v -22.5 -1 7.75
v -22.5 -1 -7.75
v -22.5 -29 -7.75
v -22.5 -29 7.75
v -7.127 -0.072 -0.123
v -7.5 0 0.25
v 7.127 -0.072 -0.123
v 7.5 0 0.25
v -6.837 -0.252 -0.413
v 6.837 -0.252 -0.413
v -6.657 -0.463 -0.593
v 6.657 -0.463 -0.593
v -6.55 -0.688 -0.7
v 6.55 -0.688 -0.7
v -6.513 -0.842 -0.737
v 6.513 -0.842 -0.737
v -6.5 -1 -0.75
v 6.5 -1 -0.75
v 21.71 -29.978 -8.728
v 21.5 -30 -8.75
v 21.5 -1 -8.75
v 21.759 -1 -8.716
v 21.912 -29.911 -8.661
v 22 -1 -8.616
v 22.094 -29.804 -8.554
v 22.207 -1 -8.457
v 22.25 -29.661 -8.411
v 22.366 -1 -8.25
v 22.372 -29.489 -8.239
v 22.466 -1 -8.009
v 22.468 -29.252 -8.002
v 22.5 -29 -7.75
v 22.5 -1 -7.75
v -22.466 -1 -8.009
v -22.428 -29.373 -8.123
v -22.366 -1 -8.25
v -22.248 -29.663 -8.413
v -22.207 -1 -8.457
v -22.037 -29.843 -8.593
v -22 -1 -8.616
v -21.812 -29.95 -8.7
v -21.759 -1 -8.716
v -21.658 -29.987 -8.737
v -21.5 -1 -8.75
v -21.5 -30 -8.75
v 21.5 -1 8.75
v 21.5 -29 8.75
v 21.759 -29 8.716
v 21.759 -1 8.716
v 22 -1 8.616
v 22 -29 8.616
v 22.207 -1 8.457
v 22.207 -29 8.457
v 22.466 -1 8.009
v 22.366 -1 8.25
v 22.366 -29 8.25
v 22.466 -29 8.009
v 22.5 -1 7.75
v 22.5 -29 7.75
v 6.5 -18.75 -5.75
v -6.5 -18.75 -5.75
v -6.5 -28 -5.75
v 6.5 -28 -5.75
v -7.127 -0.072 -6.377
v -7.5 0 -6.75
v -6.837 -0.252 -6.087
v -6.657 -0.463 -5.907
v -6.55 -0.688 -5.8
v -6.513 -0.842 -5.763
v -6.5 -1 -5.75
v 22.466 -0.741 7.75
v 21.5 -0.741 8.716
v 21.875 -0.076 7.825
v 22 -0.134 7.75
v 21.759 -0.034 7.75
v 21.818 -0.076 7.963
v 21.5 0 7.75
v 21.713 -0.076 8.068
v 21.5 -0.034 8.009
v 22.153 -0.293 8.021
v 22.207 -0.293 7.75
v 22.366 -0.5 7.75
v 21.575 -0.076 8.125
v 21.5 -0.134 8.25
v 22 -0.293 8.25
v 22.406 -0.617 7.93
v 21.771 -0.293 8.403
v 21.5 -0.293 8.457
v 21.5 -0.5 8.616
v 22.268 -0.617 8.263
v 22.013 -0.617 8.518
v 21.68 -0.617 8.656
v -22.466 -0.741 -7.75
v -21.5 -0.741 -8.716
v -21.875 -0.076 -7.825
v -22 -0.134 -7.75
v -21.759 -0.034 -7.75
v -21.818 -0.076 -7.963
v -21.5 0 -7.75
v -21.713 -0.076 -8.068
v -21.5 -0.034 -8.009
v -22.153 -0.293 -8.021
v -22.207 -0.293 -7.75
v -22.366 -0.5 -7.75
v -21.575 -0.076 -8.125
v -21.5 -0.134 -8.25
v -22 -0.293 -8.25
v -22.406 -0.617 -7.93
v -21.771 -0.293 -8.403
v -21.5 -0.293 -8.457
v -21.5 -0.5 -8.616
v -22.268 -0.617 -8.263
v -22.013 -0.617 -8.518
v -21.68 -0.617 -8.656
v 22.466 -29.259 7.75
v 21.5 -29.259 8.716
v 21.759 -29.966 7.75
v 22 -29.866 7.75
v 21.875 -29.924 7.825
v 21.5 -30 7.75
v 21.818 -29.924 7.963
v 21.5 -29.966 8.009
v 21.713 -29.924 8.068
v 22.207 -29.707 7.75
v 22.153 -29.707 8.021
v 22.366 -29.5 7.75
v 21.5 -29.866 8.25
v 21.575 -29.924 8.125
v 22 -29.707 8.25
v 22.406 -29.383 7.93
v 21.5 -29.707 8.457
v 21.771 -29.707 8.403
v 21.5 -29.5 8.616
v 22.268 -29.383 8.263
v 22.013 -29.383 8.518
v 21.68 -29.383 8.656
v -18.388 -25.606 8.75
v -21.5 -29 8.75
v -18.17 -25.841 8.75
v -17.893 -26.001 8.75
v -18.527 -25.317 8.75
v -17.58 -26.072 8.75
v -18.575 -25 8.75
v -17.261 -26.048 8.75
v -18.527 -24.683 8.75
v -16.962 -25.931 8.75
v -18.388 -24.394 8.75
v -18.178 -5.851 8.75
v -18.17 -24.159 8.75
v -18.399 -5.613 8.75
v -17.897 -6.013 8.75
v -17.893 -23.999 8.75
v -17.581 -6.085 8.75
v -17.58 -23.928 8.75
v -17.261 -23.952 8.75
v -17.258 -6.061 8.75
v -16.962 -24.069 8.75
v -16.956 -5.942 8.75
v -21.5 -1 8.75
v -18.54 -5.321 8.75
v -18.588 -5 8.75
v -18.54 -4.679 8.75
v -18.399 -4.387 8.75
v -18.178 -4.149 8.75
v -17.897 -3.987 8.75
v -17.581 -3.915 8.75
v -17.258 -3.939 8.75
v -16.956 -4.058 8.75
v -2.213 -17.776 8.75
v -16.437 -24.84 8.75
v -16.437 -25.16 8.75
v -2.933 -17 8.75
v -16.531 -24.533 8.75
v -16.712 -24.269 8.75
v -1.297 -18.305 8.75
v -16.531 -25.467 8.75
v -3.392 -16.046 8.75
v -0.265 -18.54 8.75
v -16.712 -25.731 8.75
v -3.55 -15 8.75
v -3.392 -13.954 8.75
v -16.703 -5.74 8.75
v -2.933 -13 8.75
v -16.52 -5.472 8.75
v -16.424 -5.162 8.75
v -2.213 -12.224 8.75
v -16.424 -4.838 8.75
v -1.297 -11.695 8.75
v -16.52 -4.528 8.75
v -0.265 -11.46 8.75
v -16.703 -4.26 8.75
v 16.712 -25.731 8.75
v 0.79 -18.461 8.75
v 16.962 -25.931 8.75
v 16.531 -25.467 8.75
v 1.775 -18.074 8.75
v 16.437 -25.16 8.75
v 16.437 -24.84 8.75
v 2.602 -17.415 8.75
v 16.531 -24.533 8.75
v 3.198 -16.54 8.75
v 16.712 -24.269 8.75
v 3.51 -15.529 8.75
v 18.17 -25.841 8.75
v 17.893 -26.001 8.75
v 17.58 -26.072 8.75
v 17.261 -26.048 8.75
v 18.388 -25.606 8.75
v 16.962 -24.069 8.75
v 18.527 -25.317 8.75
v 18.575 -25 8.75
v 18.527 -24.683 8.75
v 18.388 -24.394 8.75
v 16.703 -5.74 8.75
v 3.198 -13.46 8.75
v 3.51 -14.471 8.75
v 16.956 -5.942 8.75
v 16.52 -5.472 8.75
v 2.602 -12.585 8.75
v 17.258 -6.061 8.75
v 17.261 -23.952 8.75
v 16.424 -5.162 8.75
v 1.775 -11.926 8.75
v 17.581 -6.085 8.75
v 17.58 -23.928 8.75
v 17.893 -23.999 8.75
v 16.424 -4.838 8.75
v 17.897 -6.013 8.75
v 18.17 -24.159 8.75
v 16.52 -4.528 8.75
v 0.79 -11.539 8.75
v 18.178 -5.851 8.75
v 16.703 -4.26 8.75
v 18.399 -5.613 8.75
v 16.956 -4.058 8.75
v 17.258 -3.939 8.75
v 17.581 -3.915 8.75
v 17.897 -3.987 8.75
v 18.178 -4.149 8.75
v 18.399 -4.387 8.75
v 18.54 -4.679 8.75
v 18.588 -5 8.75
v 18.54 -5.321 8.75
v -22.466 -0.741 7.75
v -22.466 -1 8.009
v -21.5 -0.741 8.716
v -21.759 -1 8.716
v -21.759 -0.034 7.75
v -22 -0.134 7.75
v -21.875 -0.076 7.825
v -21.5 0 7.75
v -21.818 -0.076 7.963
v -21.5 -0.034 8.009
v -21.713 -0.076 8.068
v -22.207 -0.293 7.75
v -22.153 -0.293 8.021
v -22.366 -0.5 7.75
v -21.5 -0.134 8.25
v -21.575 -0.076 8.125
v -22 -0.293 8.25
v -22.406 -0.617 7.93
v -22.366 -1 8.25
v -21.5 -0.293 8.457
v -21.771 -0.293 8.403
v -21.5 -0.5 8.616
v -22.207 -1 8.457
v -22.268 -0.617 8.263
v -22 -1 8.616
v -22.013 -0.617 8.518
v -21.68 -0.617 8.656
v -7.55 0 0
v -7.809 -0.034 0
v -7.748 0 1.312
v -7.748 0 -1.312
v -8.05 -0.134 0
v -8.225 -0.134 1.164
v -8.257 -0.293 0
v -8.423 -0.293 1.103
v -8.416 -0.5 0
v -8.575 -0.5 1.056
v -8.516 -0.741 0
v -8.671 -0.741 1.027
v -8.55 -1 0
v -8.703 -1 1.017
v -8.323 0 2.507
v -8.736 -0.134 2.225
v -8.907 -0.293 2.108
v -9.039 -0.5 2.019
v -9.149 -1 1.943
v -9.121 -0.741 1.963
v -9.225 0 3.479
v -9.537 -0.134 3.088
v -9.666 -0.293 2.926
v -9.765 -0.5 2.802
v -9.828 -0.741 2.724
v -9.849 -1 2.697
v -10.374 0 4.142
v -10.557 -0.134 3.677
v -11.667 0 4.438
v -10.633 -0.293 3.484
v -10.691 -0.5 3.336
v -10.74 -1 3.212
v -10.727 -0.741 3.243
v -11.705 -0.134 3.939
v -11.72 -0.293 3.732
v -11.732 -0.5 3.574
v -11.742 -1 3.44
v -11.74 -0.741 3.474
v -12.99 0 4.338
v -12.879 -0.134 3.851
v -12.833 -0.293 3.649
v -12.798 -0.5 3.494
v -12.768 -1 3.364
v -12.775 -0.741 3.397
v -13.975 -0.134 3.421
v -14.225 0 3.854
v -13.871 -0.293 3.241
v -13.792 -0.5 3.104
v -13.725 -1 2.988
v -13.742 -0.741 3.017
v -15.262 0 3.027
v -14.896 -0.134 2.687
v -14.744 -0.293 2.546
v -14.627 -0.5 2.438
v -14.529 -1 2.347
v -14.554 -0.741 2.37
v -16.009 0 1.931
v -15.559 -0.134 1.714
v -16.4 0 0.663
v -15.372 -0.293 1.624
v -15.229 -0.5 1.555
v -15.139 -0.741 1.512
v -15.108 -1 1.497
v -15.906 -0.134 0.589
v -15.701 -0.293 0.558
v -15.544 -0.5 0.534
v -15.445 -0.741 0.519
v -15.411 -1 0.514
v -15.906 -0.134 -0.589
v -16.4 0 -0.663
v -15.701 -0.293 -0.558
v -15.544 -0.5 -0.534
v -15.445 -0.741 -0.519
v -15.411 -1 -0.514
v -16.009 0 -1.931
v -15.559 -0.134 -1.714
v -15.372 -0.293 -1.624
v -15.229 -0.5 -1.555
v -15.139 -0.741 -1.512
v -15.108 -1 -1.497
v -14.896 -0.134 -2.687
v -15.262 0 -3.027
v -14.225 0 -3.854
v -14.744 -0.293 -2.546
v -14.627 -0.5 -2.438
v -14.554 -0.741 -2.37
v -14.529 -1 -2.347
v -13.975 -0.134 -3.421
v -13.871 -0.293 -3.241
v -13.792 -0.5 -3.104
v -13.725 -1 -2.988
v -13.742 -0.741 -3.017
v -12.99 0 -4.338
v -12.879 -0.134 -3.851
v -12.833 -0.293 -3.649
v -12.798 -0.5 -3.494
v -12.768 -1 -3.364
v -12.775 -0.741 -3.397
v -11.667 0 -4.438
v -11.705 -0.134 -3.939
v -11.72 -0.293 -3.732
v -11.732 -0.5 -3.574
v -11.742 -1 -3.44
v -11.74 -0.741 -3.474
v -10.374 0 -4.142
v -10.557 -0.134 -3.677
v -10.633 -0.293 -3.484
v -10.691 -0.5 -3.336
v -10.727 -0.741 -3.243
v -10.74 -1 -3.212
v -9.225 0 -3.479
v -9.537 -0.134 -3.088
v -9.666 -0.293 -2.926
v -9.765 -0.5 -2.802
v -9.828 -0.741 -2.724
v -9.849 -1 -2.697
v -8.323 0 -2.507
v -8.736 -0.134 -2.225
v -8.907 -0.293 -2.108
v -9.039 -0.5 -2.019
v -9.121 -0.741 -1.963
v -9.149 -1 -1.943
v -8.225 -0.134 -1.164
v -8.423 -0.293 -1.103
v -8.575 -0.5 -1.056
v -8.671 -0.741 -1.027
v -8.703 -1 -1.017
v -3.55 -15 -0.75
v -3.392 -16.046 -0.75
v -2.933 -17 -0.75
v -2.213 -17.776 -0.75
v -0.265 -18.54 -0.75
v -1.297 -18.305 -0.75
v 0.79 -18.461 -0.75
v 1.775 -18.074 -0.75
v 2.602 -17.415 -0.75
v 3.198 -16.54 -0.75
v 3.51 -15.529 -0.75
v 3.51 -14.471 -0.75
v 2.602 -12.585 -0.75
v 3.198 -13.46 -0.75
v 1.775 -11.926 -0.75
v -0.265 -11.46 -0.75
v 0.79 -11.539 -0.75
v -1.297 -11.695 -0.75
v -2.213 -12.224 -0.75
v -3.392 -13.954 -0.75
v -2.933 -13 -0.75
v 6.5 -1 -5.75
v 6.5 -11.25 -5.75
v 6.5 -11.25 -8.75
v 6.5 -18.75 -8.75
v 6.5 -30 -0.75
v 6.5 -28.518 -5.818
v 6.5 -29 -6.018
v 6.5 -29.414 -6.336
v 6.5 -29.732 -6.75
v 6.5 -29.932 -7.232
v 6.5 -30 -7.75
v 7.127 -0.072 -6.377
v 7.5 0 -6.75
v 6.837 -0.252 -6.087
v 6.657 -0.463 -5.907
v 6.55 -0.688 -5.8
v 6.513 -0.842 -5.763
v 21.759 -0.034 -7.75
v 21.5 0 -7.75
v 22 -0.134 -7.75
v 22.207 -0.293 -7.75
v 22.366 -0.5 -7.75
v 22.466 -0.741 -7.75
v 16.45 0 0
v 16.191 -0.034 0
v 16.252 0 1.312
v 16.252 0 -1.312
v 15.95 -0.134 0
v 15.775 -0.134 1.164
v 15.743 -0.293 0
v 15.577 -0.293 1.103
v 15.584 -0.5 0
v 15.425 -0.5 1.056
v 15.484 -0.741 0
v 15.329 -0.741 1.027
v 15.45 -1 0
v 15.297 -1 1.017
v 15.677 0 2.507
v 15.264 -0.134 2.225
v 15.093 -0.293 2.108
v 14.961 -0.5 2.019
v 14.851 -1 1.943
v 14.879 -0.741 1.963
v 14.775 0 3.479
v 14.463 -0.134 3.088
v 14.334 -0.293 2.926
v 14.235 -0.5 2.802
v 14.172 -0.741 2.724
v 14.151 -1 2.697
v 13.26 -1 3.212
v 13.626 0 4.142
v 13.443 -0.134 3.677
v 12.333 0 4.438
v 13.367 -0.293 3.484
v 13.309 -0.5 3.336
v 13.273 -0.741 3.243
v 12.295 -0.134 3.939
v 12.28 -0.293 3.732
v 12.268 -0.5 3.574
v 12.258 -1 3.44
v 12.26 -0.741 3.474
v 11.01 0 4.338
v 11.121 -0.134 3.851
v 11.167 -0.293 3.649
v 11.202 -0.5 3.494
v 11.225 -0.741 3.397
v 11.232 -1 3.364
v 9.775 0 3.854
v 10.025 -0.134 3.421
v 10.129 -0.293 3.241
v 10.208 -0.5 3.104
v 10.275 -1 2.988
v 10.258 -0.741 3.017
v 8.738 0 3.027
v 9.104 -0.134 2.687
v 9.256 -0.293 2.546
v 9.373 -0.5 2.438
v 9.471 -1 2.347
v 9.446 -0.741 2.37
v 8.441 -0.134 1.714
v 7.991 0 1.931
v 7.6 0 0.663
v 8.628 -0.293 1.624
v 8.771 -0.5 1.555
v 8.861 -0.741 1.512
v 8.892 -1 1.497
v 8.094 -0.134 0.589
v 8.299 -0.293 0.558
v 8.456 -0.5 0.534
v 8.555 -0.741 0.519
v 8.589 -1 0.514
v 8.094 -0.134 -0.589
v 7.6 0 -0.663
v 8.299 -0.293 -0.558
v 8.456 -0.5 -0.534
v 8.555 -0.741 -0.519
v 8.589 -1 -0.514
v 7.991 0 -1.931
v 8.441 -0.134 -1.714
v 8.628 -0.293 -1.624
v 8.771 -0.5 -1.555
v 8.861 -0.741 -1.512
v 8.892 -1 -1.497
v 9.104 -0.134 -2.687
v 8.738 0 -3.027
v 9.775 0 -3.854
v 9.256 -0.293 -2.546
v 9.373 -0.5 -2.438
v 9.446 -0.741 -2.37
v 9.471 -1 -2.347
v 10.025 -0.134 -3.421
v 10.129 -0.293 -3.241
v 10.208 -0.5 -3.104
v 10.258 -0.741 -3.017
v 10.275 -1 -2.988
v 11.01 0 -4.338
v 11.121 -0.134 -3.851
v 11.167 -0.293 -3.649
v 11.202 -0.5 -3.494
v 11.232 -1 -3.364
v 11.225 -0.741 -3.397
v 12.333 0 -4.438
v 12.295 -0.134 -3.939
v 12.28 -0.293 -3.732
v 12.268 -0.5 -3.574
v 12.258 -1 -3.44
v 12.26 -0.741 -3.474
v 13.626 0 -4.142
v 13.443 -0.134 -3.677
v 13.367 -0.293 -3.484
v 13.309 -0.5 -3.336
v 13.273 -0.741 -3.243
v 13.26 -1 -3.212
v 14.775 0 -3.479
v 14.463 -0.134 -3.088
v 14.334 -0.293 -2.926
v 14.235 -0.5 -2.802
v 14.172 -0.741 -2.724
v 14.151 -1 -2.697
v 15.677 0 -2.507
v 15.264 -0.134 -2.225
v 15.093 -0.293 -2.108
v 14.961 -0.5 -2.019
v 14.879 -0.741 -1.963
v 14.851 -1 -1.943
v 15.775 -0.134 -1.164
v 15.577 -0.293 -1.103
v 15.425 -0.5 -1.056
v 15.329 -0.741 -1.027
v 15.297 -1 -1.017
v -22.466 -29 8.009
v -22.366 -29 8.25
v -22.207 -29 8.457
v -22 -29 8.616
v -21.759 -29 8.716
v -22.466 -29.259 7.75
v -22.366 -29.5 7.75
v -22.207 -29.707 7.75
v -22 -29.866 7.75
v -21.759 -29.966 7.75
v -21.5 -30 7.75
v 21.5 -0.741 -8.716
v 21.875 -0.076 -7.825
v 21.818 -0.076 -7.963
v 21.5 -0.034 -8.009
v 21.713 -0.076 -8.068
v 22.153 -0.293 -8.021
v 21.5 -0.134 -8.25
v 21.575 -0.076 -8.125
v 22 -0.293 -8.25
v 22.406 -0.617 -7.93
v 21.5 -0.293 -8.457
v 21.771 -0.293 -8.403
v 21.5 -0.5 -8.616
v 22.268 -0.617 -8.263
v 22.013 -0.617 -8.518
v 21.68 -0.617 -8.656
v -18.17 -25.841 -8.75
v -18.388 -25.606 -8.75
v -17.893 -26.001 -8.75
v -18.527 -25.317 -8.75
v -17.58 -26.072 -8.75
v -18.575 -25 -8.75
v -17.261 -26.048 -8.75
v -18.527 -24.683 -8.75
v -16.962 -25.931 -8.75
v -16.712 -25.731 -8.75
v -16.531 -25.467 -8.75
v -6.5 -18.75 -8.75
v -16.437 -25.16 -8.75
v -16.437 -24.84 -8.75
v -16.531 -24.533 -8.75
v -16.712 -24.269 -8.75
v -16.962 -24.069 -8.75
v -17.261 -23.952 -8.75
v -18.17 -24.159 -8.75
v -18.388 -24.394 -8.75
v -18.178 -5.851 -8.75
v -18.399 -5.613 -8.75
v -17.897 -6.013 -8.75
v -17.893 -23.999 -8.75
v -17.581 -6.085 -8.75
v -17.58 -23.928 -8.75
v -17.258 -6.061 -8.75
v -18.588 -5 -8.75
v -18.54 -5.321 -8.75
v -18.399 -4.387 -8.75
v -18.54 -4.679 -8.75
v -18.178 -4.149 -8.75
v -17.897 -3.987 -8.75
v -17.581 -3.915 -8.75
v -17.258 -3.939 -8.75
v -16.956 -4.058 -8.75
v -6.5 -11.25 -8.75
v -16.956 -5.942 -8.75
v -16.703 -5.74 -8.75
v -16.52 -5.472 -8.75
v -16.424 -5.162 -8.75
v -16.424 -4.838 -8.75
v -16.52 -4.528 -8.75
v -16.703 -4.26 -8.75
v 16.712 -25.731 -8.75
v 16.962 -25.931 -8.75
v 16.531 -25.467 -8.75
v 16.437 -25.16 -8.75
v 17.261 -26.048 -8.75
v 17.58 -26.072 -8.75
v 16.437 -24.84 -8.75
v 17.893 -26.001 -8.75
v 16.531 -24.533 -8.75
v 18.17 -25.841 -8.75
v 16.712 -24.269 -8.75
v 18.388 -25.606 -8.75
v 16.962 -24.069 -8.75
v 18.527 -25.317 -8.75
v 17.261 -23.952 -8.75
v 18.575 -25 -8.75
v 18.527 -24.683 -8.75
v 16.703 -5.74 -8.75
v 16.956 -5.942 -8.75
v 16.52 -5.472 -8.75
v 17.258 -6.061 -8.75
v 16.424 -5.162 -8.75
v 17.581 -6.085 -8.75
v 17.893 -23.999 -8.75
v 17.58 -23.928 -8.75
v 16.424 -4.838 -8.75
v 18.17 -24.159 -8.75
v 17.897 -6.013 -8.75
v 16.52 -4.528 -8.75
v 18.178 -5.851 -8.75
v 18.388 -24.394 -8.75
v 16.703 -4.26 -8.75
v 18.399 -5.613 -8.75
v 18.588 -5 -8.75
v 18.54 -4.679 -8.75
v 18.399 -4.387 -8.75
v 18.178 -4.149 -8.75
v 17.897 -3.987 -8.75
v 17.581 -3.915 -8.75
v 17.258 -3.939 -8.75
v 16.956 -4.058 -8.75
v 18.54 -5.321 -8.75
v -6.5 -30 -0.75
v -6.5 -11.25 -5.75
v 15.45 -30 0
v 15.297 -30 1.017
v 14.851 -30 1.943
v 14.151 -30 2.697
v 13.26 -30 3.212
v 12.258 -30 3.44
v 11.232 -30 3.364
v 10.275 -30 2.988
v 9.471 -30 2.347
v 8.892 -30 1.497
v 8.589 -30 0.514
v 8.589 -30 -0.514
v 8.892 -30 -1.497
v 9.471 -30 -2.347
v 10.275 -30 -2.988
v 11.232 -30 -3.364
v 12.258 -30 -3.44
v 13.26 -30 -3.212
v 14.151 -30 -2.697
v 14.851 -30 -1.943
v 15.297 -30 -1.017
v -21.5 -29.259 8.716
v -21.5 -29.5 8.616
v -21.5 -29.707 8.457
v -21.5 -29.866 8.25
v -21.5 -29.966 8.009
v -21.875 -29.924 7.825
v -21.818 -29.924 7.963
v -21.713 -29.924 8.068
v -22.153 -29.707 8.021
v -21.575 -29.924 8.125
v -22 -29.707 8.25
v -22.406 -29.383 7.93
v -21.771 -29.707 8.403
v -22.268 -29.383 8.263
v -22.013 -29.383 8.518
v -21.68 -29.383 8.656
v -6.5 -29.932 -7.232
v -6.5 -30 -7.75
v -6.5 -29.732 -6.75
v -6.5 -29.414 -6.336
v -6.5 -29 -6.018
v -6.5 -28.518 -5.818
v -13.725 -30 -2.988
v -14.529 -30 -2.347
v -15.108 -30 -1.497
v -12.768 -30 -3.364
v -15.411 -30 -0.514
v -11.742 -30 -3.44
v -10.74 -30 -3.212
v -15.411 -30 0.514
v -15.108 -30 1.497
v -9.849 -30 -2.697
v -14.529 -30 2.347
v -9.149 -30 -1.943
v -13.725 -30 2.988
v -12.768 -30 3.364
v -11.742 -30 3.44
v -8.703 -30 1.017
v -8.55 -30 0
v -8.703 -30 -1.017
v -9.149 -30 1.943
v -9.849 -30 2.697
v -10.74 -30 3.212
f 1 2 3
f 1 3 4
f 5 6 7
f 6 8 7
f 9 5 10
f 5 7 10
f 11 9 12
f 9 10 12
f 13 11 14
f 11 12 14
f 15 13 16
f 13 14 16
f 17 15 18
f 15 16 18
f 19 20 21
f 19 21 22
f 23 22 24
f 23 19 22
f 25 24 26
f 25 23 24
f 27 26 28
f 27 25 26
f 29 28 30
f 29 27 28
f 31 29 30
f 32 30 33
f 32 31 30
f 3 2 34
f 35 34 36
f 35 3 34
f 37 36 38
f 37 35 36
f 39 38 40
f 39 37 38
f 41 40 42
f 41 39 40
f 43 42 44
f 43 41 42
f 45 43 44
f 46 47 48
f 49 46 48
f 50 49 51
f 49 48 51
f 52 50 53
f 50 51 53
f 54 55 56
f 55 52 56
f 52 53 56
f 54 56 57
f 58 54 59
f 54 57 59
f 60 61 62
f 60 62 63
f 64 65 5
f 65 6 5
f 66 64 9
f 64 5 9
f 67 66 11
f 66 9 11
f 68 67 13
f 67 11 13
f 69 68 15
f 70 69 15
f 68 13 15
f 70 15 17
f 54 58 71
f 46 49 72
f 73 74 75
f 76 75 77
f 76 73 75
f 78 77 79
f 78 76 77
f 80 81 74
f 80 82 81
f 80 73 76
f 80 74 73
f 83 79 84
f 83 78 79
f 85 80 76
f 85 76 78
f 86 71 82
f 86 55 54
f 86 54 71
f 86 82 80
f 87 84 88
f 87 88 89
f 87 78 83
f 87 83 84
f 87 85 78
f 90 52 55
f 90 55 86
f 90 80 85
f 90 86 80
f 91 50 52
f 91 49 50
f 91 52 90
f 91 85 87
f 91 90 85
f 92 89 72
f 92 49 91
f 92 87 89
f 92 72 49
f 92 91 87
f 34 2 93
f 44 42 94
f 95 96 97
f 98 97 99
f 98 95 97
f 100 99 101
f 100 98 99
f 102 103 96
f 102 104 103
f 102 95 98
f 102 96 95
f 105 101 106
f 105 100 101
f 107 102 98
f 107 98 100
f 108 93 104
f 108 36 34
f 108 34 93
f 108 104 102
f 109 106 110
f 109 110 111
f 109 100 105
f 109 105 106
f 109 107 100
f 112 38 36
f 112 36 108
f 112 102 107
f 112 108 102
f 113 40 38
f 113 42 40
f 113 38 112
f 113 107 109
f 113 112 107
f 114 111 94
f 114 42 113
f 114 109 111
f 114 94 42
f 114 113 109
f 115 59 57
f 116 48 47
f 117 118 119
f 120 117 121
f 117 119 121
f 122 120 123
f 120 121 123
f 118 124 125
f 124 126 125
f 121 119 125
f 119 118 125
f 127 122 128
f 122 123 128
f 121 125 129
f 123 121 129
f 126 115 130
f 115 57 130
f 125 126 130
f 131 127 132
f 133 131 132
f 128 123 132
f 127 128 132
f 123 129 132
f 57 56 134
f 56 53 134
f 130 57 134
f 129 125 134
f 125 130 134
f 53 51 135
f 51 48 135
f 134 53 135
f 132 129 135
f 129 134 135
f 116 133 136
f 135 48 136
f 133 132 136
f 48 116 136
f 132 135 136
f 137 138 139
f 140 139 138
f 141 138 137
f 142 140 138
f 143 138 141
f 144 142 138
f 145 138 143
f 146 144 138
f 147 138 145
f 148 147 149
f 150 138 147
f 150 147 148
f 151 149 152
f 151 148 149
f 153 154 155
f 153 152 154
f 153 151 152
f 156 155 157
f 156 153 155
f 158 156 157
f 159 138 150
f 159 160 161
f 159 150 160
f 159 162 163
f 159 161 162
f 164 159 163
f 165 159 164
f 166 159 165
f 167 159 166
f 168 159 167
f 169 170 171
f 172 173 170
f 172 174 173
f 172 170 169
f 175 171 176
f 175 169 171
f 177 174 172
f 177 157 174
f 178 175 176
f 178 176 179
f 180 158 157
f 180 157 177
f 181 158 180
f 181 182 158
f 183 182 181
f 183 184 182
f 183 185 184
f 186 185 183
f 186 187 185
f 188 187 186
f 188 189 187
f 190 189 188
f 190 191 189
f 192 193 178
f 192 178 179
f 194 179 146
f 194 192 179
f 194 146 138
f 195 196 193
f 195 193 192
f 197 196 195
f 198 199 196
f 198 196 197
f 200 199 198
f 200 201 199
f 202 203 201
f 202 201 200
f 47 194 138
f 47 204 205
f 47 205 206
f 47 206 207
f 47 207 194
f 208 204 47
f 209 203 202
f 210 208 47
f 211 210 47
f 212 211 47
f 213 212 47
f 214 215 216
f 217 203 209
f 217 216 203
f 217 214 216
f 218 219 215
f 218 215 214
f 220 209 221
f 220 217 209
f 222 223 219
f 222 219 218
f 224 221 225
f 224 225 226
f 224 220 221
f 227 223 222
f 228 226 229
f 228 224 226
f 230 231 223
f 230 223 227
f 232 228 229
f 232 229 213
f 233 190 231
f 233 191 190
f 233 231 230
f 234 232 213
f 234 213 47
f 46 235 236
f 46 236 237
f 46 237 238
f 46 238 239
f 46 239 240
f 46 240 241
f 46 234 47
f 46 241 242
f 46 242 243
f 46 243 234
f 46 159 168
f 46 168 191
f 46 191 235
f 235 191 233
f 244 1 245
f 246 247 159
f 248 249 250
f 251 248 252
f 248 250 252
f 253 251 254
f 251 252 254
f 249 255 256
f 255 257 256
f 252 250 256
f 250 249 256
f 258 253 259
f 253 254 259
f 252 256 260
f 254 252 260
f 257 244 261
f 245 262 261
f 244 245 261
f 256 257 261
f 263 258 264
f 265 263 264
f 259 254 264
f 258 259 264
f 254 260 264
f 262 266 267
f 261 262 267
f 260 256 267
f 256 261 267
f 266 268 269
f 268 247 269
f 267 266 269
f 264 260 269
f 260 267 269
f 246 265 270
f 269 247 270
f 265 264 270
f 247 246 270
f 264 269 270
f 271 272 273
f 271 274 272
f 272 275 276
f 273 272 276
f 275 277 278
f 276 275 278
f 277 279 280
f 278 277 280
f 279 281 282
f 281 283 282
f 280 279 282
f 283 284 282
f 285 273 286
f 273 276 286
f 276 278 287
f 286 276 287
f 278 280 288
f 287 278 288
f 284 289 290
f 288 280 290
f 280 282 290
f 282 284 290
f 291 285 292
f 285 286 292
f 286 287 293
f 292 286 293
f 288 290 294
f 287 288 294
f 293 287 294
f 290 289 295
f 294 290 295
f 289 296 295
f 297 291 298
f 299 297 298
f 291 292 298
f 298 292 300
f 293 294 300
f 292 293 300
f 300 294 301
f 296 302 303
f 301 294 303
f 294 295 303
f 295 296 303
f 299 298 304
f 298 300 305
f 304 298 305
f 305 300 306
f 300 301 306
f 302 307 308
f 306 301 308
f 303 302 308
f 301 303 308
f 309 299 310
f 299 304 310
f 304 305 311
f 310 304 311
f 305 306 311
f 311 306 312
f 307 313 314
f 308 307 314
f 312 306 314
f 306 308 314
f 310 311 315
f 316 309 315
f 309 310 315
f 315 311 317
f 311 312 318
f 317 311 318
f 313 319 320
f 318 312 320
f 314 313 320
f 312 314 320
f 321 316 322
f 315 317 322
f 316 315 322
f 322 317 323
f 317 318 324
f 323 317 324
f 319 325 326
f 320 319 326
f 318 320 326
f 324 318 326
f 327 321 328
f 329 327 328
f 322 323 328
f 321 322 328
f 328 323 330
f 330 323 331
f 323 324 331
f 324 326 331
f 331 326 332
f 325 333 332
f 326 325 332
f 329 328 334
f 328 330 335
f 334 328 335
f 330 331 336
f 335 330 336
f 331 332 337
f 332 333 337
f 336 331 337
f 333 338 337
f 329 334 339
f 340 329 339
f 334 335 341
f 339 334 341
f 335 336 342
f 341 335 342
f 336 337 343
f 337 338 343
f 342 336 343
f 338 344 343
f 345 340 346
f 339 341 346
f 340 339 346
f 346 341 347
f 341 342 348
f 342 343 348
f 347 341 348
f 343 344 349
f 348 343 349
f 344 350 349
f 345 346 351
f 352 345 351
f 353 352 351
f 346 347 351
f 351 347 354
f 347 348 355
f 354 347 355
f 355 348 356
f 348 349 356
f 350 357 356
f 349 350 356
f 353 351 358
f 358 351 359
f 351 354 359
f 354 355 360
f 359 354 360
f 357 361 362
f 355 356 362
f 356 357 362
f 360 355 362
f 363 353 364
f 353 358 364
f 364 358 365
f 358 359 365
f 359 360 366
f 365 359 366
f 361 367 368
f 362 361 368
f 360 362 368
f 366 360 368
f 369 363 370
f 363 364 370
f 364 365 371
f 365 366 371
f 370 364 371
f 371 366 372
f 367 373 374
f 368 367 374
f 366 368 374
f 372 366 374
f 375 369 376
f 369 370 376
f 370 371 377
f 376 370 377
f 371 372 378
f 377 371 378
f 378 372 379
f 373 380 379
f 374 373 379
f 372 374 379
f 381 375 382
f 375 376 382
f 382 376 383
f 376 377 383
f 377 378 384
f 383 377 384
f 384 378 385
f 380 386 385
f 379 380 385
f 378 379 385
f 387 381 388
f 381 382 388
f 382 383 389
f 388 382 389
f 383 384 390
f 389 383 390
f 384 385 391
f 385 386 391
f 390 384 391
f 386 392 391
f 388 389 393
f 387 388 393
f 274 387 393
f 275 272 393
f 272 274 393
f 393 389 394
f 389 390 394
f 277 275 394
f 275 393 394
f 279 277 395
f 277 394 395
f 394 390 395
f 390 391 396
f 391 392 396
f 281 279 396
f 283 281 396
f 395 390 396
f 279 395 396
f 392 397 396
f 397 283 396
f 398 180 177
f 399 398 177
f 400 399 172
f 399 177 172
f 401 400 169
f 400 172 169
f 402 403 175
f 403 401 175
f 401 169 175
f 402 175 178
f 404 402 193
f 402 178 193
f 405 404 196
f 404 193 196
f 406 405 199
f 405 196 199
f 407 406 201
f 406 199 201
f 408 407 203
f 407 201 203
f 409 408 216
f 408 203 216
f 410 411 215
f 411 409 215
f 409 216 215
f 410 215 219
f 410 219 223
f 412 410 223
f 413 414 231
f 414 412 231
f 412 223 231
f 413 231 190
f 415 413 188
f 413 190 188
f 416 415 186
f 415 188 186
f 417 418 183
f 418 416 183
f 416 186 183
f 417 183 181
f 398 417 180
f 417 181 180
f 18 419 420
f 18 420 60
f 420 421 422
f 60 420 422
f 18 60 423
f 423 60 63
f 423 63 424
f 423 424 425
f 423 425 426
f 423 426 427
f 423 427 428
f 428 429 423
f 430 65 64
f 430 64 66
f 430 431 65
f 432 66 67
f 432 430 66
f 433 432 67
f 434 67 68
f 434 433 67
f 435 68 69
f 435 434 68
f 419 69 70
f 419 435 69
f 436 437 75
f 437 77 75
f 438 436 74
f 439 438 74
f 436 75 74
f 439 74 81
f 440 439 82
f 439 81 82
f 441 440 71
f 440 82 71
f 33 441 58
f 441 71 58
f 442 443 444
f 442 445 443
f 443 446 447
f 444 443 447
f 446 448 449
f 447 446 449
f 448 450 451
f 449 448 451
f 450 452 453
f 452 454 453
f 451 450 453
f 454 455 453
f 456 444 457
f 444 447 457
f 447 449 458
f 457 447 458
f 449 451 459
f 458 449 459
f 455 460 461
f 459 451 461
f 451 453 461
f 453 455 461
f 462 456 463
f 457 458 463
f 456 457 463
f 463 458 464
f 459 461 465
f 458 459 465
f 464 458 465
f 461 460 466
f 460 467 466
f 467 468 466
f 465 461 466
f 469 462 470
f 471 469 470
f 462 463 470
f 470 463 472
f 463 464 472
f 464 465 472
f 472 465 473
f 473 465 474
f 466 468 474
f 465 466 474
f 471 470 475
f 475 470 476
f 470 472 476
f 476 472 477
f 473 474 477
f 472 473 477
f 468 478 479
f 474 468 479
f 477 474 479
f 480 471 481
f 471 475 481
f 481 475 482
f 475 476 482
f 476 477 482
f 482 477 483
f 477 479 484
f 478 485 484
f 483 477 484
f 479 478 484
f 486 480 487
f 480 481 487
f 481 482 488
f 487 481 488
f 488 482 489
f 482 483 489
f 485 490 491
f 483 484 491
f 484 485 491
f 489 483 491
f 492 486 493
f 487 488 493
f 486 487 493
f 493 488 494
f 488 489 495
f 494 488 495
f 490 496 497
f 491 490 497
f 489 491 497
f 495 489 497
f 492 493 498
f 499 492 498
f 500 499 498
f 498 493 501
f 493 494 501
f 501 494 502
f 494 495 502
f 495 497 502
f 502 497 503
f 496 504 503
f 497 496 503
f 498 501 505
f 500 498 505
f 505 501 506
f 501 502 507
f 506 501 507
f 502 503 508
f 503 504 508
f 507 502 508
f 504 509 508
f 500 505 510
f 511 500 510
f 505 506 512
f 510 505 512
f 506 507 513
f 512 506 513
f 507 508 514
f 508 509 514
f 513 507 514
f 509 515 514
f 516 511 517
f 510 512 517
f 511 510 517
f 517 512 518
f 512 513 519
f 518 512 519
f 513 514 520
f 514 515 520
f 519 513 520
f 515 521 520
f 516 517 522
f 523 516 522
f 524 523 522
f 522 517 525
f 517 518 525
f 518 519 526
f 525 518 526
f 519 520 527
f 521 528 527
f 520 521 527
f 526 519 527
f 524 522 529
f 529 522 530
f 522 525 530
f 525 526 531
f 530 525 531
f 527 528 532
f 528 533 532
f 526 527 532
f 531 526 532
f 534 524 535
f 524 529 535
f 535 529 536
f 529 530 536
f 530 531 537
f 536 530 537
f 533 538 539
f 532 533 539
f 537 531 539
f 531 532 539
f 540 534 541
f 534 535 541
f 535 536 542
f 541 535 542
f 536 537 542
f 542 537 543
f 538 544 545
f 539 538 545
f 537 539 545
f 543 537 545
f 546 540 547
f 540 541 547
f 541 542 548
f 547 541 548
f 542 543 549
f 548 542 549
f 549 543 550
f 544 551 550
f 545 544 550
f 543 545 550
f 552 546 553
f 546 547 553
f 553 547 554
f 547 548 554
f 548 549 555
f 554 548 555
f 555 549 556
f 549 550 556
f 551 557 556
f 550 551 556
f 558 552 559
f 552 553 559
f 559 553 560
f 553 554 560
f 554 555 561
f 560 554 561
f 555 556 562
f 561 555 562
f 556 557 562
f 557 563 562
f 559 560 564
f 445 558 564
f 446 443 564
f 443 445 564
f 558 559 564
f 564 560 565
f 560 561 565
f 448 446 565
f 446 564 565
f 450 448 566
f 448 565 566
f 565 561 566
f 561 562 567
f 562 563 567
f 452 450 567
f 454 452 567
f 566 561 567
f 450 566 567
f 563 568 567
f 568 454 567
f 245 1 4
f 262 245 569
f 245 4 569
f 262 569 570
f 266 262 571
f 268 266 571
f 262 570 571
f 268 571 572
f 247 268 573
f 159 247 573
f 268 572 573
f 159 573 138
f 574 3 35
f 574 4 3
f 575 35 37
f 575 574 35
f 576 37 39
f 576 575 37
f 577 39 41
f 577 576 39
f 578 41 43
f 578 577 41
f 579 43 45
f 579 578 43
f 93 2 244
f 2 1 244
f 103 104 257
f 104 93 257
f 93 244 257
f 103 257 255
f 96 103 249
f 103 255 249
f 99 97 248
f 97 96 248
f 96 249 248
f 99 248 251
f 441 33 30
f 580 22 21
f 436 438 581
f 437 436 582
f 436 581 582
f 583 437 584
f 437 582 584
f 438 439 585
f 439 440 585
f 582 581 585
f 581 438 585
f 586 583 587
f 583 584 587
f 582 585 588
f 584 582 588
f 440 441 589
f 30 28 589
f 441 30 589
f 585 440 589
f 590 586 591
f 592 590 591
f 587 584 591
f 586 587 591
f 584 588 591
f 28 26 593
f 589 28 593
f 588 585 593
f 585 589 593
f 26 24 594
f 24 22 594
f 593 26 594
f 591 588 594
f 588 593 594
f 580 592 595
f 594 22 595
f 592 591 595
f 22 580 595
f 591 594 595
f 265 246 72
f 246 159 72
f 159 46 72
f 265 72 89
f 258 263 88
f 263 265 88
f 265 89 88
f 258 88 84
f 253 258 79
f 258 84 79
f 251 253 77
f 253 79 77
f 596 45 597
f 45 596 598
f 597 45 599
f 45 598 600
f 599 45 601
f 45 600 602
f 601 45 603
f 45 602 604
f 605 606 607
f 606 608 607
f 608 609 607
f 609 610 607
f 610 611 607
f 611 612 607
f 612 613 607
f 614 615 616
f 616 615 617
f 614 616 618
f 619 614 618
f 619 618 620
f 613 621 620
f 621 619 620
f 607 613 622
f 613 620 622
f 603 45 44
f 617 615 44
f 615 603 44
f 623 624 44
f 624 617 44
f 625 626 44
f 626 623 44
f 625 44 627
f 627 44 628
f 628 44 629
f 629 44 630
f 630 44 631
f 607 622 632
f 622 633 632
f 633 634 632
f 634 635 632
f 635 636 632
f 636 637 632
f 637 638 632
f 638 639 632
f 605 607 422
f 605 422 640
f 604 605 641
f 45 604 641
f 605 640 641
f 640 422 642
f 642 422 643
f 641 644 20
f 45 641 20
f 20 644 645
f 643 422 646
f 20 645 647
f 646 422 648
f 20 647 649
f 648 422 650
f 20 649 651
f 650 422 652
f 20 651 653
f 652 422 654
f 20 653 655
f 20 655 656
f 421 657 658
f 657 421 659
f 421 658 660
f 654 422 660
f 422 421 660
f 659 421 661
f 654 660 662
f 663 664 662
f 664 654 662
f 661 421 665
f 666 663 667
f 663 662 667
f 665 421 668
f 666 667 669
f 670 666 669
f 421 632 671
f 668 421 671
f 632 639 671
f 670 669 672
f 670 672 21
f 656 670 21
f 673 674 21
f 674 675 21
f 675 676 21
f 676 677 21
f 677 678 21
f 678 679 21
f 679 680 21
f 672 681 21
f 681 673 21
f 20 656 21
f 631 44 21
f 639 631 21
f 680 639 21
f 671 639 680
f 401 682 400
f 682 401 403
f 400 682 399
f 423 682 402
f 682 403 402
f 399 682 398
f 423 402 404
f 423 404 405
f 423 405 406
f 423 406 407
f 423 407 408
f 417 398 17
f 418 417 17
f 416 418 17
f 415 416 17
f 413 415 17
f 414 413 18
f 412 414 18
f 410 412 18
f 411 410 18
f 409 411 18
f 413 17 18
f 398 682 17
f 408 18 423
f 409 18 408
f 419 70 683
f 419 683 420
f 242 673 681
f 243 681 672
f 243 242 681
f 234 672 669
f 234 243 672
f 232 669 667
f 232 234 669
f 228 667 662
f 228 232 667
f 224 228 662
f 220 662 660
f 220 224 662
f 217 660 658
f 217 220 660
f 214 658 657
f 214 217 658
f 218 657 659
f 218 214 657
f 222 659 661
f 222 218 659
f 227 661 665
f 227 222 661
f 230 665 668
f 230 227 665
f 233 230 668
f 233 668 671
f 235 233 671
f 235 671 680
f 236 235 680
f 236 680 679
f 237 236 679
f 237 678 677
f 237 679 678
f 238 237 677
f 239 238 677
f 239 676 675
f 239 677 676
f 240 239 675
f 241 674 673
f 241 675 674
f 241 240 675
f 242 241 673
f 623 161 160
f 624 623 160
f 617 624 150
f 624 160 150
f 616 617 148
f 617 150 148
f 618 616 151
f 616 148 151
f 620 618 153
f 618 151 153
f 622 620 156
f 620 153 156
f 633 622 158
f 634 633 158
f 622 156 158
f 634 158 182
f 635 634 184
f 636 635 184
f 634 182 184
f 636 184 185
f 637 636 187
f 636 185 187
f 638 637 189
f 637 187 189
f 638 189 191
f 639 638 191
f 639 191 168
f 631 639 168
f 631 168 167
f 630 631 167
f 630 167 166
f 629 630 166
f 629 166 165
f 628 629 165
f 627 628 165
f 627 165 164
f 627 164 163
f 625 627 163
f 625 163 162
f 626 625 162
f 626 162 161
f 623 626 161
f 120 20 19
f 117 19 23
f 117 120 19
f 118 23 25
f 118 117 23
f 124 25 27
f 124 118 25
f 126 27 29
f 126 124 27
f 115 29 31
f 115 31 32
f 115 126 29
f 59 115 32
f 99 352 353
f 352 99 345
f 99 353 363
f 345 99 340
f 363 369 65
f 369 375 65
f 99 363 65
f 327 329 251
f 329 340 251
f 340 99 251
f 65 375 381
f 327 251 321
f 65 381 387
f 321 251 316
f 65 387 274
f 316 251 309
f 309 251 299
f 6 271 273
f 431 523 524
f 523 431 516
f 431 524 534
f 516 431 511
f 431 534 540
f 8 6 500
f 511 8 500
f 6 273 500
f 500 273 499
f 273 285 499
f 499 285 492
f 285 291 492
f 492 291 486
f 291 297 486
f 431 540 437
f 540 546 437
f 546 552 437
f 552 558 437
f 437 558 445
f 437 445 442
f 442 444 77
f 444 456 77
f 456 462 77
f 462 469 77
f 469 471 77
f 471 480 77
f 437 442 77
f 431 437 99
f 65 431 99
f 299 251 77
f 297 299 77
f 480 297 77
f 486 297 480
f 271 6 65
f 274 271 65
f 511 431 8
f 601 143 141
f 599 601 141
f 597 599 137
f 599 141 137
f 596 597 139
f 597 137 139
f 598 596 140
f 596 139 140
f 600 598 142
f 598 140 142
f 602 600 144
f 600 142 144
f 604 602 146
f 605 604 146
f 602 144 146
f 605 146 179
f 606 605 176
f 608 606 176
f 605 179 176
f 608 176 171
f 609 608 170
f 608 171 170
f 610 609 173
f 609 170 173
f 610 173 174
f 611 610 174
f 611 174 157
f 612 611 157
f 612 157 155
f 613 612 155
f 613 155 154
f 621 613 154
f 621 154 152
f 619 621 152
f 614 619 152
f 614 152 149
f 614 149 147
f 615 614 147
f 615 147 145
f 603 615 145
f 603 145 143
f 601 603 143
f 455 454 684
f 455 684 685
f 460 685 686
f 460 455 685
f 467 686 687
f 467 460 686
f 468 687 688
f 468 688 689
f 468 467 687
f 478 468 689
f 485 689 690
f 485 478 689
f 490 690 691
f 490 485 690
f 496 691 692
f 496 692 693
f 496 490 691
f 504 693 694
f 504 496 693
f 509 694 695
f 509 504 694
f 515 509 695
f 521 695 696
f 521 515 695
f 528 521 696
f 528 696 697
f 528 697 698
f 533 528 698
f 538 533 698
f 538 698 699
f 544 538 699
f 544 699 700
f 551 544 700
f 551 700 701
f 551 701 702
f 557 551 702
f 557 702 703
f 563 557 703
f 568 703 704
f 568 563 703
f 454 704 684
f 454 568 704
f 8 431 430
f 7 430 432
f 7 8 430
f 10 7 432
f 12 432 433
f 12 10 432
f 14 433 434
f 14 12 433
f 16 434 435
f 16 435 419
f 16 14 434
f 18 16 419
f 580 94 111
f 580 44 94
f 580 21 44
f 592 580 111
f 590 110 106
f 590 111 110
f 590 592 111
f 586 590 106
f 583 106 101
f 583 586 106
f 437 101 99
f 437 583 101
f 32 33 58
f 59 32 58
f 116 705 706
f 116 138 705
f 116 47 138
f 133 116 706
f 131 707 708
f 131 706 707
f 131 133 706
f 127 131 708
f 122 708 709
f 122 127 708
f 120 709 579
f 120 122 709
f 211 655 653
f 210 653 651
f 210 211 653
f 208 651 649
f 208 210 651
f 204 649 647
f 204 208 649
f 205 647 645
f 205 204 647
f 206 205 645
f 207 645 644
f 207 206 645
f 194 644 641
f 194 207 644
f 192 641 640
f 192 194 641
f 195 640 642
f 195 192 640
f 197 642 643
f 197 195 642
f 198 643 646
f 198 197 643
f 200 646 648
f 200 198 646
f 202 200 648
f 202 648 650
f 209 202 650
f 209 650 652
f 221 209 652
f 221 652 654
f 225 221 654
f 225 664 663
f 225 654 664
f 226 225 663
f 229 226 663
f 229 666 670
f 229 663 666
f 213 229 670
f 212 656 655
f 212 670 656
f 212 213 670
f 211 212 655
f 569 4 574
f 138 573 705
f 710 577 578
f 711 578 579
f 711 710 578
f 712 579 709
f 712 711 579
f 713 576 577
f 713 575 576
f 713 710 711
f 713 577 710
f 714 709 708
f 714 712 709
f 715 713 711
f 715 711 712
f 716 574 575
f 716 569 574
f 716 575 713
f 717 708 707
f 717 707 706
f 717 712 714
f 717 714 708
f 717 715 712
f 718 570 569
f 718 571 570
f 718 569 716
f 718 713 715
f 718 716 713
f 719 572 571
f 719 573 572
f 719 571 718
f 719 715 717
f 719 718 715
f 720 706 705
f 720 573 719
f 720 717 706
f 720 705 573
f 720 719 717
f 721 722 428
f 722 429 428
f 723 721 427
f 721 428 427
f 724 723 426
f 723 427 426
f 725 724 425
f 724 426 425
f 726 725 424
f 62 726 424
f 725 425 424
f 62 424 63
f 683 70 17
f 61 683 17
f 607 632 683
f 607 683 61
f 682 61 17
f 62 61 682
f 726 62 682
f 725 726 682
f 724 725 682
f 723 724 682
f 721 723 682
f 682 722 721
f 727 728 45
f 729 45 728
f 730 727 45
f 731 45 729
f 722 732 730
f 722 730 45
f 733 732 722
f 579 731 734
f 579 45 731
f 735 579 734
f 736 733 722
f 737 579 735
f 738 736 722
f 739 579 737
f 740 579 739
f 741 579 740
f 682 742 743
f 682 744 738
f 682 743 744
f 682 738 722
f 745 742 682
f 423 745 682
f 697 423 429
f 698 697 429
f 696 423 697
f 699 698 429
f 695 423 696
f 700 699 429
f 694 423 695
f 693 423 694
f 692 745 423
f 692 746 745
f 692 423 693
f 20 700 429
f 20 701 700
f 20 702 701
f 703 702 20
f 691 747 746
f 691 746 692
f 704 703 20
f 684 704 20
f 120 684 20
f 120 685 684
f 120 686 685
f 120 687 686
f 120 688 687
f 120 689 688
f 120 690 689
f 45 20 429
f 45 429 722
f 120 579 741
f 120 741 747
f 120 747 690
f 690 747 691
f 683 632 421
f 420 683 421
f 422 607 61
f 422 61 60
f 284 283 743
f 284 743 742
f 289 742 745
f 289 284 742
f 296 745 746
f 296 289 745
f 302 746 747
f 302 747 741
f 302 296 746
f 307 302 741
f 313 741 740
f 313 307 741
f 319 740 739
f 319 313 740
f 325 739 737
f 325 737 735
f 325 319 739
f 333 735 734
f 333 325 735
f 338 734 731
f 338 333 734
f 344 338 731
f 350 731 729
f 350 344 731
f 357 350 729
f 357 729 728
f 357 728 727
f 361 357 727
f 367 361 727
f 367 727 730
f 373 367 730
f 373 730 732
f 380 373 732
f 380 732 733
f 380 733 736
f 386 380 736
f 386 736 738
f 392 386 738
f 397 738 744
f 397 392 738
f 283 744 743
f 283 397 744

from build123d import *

# Parameters (mm, degrees)
SKETCH_W        = 45
SKETCH_H        = 17.5
SKETCH_R        = 3.45
SKETCH_W_2      = 13
SKETCH_H_2      = 5
PAD_DEPTH       = 30
SKETCH001_R     = 3.55
SKETCH001_R_2   = 1.075196
SKETCH001_R_3   = 1.087844
POCKET_DEPTH    = 131.18917
SKETCH002_W     = 13
SKETCH002_H     = 7.5
POCKET001_DEPTH = 5
FILLET_R        = 1
FILLET001_R     = 2


with BuildPart() as part:
    # Sketch → Pad (new body)
    with BuildSketch(Plane.XZ):
        Rectangle(SKETCH_W, SKETCH_H)
        with Locations((-12, 0)):
            Circle(SKETCH_R, mode=Mode.SUBTRACT)
        with Locations((12, 0)):
            Circle(SKETCH_R, mode=Mode.SUBTRACT)
        with Locations((0, -3.25)):
            Rectangle(SKETCH_W_2, SKETCH_H_2, mode=Mode.SUBTRACT)
    extrude(amount=PAD_DEPTH)

    # Sketch001 (on DatumPlane) → Pocket (cut, through all)
    with BuildSketch(Plane(origin=(0, 0, 8.75), x_dir=(-1, 0, 0), z_dir=(0, 0, 1))):
        with Locations((0, 15)):
            Circle(SKETCH001_R)
        with Locations((17.5, 25)):
            Circle(SKETCH001_R_2)
        with Locations((17.5, 5)):
            Circle(SKETCH001_R_3)
    pocket = extrude(amount=-POCKET_DEPTH, mode=Mode.SUBTRACT)

    # Mirrored: Pocket across Sketch001 V_Axis
    add(pocket.mirror(Plane(origin=(0, 0, 8.75), x_dir=(0, 0, 1), z_dir=(-1, 0, 0))), mode=Mode.SUBTRACT)

    # Sketch002 (on Face1 of Mirrored) → Pocket001 (cut)
    with BuildSketch(Plane(origin=(0, 0, -8.75), x_dir=(1, 0, 0), z_dir=(0, 0, -1))):
        with Locations((0, 15)):
            Rectangle(SKETCH002_W, SKETCH002_H)
    extrude(amount=-POCKET001_DEPTH, mode=Mode.SUBTRACT)

    # Fillet
    fillet_edges = [part.edges().sort_by_distance(p)[0] for p in [
        (-22.5, -15, 8.75),
        (-22.5, -15, -8.75),
        (-22.5, 0, 0),
        (-22.5, -30, 0),
        (22.5, -15, -8.75),
        (22.5, -15, 8.75),
        (22.5, 0, 0),
        (22.5, -30, 0),
        (0, 0, -8.75),
        (0, 0, 8.75),
        (0, 0, -5.75),
        (6.5, 0, -3.25),
        (0, 0, -0.75),
        (-6.5, 0, -3.25),
        (8.55, 0, 0),
        (-15.45, 0, 0),
        (0, -30, 8.75),
    ]]
    fillet(fillet_edges, radius=FILLET_R)

    # Fillet001
    fillet001_edges = [part.edges().sort_by_distance(p)[0] for p in [
        (0, -30, -5.75),
    ]]
    fillet(fillet001_edges, radius=FILLET001_R)


solid = part.part
